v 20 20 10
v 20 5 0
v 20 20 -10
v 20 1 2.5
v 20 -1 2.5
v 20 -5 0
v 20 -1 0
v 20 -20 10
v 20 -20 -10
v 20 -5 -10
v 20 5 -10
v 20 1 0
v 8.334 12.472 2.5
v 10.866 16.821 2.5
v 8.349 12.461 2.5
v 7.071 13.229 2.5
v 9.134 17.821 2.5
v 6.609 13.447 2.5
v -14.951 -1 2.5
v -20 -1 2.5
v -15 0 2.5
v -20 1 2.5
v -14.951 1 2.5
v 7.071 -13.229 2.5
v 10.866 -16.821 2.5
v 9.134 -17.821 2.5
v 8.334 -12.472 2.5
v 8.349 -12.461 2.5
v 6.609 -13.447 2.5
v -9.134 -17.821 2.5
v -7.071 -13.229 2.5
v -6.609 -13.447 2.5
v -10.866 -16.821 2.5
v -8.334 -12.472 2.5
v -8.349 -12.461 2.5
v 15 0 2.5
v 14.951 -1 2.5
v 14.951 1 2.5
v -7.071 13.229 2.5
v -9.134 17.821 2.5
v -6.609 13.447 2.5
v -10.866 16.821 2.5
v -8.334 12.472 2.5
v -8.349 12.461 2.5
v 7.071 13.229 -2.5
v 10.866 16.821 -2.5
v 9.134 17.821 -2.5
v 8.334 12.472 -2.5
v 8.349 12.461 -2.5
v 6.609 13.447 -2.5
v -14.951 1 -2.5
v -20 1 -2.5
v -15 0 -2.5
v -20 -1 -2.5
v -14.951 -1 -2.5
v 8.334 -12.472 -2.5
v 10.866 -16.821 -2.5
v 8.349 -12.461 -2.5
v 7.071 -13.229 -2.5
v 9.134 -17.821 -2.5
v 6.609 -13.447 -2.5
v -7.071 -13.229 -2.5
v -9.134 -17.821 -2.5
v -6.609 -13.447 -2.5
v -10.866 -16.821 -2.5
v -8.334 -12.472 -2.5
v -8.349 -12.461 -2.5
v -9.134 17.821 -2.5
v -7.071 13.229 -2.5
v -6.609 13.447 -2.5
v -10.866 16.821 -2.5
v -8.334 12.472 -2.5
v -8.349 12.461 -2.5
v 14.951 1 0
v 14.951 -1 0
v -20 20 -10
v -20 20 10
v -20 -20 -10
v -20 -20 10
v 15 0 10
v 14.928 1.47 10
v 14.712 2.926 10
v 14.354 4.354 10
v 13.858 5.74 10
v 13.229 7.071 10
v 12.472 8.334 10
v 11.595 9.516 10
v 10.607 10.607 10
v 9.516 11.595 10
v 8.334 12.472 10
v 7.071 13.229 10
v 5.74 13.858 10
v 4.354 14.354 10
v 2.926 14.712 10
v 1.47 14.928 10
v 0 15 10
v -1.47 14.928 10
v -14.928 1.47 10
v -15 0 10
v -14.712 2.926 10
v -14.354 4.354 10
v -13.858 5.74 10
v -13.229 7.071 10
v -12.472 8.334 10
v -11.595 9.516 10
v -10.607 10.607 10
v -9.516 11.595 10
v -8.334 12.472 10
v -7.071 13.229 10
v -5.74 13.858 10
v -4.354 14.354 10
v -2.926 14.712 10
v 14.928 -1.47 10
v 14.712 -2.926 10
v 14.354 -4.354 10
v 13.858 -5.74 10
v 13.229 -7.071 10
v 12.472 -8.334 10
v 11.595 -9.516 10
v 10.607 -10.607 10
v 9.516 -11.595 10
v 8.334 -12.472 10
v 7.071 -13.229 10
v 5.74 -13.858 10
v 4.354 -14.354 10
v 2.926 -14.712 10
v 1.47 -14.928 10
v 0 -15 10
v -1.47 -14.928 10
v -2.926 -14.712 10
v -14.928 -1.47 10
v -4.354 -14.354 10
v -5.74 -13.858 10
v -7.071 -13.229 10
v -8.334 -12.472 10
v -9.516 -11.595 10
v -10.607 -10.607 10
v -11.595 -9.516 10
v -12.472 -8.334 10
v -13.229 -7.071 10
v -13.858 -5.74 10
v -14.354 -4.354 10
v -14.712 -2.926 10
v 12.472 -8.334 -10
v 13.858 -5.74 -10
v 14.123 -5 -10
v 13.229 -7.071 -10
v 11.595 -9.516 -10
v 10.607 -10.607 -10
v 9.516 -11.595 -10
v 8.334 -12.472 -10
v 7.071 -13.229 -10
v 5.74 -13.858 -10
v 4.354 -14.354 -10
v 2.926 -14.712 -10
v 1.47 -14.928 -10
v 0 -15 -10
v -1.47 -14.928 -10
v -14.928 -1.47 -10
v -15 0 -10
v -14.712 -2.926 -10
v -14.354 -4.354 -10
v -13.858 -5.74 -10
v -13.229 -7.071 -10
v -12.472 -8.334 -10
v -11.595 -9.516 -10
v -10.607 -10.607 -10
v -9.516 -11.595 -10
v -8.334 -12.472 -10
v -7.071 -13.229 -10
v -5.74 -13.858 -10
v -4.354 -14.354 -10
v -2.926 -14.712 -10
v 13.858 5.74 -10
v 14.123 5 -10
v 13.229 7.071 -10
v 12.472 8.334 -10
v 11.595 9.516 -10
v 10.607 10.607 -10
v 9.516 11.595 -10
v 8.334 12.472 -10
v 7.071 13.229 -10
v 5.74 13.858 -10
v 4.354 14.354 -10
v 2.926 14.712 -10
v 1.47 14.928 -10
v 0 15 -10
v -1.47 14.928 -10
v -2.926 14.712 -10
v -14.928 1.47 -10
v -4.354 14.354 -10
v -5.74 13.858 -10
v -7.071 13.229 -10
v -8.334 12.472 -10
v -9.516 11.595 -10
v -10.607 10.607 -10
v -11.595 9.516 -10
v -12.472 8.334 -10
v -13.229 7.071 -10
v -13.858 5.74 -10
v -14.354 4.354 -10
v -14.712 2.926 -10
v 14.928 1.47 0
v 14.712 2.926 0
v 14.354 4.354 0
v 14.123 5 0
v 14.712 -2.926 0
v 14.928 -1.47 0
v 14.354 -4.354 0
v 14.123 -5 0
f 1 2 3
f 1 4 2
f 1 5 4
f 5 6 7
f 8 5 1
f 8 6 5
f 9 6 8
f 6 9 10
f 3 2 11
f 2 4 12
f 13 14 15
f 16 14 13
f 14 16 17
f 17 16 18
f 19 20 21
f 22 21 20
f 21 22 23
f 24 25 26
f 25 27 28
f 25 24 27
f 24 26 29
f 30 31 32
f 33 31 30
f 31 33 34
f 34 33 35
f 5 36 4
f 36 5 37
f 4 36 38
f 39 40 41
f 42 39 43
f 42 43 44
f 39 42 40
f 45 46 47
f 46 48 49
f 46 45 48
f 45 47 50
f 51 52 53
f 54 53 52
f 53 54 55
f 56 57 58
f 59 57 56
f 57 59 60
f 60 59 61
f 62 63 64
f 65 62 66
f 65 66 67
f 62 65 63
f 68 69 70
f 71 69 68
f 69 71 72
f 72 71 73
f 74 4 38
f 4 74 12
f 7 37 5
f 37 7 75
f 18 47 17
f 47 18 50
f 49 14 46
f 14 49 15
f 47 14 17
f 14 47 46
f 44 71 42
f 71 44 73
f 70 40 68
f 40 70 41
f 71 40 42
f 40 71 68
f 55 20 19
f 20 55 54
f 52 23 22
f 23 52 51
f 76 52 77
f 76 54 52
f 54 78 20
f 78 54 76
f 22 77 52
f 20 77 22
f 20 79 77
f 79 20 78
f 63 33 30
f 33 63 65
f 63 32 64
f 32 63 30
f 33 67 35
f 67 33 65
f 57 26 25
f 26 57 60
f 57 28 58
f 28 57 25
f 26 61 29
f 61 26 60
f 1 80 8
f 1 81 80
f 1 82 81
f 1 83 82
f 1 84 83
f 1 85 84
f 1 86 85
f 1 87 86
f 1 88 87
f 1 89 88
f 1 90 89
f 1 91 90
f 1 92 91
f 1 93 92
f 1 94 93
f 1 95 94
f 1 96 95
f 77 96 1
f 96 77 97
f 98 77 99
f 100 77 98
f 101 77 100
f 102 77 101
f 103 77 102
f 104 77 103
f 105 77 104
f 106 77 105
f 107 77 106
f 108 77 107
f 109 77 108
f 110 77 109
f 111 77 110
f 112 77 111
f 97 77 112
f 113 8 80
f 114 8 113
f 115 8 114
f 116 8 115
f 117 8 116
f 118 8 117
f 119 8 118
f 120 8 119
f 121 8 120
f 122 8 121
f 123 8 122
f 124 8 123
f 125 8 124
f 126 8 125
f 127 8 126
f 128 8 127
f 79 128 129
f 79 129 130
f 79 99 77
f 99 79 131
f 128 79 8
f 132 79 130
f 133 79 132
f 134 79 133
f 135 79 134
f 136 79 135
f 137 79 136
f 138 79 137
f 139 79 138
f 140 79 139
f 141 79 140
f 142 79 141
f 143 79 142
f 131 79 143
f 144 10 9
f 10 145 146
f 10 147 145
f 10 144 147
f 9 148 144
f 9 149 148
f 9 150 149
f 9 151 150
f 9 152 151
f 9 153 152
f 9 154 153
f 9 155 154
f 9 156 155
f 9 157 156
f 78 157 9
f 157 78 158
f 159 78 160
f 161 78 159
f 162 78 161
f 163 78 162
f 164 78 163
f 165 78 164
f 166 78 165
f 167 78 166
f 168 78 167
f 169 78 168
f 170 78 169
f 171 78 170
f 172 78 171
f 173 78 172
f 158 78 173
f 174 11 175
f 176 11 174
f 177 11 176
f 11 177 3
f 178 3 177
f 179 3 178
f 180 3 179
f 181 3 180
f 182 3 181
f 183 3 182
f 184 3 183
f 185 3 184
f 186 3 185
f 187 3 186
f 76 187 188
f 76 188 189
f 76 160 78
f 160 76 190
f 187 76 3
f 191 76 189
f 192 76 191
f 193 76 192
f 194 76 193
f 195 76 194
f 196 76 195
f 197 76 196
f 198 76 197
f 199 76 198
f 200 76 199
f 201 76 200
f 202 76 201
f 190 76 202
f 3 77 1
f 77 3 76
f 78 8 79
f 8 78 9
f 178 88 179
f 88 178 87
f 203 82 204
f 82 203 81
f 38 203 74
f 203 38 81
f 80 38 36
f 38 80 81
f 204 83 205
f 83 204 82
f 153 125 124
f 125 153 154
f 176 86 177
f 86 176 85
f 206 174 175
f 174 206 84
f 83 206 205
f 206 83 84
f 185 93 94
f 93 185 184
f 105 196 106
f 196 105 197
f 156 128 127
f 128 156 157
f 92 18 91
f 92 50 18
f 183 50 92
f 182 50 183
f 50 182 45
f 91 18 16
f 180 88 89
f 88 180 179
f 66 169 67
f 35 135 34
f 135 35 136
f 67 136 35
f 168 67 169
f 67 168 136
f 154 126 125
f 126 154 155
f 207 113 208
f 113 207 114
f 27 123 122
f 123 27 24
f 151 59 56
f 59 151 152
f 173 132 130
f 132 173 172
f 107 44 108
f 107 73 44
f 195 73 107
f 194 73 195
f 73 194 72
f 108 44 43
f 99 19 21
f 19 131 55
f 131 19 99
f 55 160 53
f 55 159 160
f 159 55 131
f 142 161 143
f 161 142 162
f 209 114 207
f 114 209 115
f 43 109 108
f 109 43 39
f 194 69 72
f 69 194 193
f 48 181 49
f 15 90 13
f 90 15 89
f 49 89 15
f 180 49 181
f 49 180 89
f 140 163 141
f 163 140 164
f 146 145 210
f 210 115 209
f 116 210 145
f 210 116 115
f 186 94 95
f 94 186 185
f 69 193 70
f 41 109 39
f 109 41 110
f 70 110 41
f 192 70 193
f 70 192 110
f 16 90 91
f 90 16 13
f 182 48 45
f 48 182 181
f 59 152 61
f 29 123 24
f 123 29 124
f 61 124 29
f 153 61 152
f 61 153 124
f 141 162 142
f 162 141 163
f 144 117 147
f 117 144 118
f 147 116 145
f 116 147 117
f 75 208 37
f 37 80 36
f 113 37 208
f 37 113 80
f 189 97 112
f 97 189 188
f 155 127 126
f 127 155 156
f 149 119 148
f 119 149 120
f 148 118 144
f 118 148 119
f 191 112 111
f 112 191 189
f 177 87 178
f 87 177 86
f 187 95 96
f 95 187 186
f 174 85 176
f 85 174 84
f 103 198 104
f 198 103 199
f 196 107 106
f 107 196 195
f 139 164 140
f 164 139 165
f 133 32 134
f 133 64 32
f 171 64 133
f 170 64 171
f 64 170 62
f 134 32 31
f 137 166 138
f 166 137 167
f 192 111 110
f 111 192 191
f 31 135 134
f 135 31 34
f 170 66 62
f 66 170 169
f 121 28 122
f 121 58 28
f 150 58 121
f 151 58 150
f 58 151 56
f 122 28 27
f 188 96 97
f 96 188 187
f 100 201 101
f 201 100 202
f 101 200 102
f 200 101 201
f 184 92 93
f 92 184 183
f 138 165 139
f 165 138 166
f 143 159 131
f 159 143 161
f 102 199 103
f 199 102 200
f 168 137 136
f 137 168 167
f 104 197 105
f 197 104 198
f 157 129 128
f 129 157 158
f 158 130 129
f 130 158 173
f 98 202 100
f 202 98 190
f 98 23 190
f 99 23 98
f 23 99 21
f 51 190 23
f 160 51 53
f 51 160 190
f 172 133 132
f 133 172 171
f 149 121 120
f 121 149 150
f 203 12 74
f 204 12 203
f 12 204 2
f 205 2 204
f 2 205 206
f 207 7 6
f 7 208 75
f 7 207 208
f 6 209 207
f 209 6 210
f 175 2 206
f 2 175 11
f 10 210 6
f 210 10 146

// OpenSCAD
module centrifugal_blower_fan() {
    difference() {
        // Outer casing
        cube([40, 40, 20], center = true);
        
        // Inner cavity
        translate([0, 0, -10])
            cylinder(h = 20, r = 15, $fn = 64);
        
        // Air outlet
        translate([20, 0, -10])
            cube([20, 10, 20], center = true);
        
        // Fan blades
        for (i = [0 : 60 : 300]) {
            rotate([0, 0, i])
                translate([10, 0, 0])
                    cube([20, 2, 5], center = true);
        }
    }
}

centrifugal_blower_fan();
